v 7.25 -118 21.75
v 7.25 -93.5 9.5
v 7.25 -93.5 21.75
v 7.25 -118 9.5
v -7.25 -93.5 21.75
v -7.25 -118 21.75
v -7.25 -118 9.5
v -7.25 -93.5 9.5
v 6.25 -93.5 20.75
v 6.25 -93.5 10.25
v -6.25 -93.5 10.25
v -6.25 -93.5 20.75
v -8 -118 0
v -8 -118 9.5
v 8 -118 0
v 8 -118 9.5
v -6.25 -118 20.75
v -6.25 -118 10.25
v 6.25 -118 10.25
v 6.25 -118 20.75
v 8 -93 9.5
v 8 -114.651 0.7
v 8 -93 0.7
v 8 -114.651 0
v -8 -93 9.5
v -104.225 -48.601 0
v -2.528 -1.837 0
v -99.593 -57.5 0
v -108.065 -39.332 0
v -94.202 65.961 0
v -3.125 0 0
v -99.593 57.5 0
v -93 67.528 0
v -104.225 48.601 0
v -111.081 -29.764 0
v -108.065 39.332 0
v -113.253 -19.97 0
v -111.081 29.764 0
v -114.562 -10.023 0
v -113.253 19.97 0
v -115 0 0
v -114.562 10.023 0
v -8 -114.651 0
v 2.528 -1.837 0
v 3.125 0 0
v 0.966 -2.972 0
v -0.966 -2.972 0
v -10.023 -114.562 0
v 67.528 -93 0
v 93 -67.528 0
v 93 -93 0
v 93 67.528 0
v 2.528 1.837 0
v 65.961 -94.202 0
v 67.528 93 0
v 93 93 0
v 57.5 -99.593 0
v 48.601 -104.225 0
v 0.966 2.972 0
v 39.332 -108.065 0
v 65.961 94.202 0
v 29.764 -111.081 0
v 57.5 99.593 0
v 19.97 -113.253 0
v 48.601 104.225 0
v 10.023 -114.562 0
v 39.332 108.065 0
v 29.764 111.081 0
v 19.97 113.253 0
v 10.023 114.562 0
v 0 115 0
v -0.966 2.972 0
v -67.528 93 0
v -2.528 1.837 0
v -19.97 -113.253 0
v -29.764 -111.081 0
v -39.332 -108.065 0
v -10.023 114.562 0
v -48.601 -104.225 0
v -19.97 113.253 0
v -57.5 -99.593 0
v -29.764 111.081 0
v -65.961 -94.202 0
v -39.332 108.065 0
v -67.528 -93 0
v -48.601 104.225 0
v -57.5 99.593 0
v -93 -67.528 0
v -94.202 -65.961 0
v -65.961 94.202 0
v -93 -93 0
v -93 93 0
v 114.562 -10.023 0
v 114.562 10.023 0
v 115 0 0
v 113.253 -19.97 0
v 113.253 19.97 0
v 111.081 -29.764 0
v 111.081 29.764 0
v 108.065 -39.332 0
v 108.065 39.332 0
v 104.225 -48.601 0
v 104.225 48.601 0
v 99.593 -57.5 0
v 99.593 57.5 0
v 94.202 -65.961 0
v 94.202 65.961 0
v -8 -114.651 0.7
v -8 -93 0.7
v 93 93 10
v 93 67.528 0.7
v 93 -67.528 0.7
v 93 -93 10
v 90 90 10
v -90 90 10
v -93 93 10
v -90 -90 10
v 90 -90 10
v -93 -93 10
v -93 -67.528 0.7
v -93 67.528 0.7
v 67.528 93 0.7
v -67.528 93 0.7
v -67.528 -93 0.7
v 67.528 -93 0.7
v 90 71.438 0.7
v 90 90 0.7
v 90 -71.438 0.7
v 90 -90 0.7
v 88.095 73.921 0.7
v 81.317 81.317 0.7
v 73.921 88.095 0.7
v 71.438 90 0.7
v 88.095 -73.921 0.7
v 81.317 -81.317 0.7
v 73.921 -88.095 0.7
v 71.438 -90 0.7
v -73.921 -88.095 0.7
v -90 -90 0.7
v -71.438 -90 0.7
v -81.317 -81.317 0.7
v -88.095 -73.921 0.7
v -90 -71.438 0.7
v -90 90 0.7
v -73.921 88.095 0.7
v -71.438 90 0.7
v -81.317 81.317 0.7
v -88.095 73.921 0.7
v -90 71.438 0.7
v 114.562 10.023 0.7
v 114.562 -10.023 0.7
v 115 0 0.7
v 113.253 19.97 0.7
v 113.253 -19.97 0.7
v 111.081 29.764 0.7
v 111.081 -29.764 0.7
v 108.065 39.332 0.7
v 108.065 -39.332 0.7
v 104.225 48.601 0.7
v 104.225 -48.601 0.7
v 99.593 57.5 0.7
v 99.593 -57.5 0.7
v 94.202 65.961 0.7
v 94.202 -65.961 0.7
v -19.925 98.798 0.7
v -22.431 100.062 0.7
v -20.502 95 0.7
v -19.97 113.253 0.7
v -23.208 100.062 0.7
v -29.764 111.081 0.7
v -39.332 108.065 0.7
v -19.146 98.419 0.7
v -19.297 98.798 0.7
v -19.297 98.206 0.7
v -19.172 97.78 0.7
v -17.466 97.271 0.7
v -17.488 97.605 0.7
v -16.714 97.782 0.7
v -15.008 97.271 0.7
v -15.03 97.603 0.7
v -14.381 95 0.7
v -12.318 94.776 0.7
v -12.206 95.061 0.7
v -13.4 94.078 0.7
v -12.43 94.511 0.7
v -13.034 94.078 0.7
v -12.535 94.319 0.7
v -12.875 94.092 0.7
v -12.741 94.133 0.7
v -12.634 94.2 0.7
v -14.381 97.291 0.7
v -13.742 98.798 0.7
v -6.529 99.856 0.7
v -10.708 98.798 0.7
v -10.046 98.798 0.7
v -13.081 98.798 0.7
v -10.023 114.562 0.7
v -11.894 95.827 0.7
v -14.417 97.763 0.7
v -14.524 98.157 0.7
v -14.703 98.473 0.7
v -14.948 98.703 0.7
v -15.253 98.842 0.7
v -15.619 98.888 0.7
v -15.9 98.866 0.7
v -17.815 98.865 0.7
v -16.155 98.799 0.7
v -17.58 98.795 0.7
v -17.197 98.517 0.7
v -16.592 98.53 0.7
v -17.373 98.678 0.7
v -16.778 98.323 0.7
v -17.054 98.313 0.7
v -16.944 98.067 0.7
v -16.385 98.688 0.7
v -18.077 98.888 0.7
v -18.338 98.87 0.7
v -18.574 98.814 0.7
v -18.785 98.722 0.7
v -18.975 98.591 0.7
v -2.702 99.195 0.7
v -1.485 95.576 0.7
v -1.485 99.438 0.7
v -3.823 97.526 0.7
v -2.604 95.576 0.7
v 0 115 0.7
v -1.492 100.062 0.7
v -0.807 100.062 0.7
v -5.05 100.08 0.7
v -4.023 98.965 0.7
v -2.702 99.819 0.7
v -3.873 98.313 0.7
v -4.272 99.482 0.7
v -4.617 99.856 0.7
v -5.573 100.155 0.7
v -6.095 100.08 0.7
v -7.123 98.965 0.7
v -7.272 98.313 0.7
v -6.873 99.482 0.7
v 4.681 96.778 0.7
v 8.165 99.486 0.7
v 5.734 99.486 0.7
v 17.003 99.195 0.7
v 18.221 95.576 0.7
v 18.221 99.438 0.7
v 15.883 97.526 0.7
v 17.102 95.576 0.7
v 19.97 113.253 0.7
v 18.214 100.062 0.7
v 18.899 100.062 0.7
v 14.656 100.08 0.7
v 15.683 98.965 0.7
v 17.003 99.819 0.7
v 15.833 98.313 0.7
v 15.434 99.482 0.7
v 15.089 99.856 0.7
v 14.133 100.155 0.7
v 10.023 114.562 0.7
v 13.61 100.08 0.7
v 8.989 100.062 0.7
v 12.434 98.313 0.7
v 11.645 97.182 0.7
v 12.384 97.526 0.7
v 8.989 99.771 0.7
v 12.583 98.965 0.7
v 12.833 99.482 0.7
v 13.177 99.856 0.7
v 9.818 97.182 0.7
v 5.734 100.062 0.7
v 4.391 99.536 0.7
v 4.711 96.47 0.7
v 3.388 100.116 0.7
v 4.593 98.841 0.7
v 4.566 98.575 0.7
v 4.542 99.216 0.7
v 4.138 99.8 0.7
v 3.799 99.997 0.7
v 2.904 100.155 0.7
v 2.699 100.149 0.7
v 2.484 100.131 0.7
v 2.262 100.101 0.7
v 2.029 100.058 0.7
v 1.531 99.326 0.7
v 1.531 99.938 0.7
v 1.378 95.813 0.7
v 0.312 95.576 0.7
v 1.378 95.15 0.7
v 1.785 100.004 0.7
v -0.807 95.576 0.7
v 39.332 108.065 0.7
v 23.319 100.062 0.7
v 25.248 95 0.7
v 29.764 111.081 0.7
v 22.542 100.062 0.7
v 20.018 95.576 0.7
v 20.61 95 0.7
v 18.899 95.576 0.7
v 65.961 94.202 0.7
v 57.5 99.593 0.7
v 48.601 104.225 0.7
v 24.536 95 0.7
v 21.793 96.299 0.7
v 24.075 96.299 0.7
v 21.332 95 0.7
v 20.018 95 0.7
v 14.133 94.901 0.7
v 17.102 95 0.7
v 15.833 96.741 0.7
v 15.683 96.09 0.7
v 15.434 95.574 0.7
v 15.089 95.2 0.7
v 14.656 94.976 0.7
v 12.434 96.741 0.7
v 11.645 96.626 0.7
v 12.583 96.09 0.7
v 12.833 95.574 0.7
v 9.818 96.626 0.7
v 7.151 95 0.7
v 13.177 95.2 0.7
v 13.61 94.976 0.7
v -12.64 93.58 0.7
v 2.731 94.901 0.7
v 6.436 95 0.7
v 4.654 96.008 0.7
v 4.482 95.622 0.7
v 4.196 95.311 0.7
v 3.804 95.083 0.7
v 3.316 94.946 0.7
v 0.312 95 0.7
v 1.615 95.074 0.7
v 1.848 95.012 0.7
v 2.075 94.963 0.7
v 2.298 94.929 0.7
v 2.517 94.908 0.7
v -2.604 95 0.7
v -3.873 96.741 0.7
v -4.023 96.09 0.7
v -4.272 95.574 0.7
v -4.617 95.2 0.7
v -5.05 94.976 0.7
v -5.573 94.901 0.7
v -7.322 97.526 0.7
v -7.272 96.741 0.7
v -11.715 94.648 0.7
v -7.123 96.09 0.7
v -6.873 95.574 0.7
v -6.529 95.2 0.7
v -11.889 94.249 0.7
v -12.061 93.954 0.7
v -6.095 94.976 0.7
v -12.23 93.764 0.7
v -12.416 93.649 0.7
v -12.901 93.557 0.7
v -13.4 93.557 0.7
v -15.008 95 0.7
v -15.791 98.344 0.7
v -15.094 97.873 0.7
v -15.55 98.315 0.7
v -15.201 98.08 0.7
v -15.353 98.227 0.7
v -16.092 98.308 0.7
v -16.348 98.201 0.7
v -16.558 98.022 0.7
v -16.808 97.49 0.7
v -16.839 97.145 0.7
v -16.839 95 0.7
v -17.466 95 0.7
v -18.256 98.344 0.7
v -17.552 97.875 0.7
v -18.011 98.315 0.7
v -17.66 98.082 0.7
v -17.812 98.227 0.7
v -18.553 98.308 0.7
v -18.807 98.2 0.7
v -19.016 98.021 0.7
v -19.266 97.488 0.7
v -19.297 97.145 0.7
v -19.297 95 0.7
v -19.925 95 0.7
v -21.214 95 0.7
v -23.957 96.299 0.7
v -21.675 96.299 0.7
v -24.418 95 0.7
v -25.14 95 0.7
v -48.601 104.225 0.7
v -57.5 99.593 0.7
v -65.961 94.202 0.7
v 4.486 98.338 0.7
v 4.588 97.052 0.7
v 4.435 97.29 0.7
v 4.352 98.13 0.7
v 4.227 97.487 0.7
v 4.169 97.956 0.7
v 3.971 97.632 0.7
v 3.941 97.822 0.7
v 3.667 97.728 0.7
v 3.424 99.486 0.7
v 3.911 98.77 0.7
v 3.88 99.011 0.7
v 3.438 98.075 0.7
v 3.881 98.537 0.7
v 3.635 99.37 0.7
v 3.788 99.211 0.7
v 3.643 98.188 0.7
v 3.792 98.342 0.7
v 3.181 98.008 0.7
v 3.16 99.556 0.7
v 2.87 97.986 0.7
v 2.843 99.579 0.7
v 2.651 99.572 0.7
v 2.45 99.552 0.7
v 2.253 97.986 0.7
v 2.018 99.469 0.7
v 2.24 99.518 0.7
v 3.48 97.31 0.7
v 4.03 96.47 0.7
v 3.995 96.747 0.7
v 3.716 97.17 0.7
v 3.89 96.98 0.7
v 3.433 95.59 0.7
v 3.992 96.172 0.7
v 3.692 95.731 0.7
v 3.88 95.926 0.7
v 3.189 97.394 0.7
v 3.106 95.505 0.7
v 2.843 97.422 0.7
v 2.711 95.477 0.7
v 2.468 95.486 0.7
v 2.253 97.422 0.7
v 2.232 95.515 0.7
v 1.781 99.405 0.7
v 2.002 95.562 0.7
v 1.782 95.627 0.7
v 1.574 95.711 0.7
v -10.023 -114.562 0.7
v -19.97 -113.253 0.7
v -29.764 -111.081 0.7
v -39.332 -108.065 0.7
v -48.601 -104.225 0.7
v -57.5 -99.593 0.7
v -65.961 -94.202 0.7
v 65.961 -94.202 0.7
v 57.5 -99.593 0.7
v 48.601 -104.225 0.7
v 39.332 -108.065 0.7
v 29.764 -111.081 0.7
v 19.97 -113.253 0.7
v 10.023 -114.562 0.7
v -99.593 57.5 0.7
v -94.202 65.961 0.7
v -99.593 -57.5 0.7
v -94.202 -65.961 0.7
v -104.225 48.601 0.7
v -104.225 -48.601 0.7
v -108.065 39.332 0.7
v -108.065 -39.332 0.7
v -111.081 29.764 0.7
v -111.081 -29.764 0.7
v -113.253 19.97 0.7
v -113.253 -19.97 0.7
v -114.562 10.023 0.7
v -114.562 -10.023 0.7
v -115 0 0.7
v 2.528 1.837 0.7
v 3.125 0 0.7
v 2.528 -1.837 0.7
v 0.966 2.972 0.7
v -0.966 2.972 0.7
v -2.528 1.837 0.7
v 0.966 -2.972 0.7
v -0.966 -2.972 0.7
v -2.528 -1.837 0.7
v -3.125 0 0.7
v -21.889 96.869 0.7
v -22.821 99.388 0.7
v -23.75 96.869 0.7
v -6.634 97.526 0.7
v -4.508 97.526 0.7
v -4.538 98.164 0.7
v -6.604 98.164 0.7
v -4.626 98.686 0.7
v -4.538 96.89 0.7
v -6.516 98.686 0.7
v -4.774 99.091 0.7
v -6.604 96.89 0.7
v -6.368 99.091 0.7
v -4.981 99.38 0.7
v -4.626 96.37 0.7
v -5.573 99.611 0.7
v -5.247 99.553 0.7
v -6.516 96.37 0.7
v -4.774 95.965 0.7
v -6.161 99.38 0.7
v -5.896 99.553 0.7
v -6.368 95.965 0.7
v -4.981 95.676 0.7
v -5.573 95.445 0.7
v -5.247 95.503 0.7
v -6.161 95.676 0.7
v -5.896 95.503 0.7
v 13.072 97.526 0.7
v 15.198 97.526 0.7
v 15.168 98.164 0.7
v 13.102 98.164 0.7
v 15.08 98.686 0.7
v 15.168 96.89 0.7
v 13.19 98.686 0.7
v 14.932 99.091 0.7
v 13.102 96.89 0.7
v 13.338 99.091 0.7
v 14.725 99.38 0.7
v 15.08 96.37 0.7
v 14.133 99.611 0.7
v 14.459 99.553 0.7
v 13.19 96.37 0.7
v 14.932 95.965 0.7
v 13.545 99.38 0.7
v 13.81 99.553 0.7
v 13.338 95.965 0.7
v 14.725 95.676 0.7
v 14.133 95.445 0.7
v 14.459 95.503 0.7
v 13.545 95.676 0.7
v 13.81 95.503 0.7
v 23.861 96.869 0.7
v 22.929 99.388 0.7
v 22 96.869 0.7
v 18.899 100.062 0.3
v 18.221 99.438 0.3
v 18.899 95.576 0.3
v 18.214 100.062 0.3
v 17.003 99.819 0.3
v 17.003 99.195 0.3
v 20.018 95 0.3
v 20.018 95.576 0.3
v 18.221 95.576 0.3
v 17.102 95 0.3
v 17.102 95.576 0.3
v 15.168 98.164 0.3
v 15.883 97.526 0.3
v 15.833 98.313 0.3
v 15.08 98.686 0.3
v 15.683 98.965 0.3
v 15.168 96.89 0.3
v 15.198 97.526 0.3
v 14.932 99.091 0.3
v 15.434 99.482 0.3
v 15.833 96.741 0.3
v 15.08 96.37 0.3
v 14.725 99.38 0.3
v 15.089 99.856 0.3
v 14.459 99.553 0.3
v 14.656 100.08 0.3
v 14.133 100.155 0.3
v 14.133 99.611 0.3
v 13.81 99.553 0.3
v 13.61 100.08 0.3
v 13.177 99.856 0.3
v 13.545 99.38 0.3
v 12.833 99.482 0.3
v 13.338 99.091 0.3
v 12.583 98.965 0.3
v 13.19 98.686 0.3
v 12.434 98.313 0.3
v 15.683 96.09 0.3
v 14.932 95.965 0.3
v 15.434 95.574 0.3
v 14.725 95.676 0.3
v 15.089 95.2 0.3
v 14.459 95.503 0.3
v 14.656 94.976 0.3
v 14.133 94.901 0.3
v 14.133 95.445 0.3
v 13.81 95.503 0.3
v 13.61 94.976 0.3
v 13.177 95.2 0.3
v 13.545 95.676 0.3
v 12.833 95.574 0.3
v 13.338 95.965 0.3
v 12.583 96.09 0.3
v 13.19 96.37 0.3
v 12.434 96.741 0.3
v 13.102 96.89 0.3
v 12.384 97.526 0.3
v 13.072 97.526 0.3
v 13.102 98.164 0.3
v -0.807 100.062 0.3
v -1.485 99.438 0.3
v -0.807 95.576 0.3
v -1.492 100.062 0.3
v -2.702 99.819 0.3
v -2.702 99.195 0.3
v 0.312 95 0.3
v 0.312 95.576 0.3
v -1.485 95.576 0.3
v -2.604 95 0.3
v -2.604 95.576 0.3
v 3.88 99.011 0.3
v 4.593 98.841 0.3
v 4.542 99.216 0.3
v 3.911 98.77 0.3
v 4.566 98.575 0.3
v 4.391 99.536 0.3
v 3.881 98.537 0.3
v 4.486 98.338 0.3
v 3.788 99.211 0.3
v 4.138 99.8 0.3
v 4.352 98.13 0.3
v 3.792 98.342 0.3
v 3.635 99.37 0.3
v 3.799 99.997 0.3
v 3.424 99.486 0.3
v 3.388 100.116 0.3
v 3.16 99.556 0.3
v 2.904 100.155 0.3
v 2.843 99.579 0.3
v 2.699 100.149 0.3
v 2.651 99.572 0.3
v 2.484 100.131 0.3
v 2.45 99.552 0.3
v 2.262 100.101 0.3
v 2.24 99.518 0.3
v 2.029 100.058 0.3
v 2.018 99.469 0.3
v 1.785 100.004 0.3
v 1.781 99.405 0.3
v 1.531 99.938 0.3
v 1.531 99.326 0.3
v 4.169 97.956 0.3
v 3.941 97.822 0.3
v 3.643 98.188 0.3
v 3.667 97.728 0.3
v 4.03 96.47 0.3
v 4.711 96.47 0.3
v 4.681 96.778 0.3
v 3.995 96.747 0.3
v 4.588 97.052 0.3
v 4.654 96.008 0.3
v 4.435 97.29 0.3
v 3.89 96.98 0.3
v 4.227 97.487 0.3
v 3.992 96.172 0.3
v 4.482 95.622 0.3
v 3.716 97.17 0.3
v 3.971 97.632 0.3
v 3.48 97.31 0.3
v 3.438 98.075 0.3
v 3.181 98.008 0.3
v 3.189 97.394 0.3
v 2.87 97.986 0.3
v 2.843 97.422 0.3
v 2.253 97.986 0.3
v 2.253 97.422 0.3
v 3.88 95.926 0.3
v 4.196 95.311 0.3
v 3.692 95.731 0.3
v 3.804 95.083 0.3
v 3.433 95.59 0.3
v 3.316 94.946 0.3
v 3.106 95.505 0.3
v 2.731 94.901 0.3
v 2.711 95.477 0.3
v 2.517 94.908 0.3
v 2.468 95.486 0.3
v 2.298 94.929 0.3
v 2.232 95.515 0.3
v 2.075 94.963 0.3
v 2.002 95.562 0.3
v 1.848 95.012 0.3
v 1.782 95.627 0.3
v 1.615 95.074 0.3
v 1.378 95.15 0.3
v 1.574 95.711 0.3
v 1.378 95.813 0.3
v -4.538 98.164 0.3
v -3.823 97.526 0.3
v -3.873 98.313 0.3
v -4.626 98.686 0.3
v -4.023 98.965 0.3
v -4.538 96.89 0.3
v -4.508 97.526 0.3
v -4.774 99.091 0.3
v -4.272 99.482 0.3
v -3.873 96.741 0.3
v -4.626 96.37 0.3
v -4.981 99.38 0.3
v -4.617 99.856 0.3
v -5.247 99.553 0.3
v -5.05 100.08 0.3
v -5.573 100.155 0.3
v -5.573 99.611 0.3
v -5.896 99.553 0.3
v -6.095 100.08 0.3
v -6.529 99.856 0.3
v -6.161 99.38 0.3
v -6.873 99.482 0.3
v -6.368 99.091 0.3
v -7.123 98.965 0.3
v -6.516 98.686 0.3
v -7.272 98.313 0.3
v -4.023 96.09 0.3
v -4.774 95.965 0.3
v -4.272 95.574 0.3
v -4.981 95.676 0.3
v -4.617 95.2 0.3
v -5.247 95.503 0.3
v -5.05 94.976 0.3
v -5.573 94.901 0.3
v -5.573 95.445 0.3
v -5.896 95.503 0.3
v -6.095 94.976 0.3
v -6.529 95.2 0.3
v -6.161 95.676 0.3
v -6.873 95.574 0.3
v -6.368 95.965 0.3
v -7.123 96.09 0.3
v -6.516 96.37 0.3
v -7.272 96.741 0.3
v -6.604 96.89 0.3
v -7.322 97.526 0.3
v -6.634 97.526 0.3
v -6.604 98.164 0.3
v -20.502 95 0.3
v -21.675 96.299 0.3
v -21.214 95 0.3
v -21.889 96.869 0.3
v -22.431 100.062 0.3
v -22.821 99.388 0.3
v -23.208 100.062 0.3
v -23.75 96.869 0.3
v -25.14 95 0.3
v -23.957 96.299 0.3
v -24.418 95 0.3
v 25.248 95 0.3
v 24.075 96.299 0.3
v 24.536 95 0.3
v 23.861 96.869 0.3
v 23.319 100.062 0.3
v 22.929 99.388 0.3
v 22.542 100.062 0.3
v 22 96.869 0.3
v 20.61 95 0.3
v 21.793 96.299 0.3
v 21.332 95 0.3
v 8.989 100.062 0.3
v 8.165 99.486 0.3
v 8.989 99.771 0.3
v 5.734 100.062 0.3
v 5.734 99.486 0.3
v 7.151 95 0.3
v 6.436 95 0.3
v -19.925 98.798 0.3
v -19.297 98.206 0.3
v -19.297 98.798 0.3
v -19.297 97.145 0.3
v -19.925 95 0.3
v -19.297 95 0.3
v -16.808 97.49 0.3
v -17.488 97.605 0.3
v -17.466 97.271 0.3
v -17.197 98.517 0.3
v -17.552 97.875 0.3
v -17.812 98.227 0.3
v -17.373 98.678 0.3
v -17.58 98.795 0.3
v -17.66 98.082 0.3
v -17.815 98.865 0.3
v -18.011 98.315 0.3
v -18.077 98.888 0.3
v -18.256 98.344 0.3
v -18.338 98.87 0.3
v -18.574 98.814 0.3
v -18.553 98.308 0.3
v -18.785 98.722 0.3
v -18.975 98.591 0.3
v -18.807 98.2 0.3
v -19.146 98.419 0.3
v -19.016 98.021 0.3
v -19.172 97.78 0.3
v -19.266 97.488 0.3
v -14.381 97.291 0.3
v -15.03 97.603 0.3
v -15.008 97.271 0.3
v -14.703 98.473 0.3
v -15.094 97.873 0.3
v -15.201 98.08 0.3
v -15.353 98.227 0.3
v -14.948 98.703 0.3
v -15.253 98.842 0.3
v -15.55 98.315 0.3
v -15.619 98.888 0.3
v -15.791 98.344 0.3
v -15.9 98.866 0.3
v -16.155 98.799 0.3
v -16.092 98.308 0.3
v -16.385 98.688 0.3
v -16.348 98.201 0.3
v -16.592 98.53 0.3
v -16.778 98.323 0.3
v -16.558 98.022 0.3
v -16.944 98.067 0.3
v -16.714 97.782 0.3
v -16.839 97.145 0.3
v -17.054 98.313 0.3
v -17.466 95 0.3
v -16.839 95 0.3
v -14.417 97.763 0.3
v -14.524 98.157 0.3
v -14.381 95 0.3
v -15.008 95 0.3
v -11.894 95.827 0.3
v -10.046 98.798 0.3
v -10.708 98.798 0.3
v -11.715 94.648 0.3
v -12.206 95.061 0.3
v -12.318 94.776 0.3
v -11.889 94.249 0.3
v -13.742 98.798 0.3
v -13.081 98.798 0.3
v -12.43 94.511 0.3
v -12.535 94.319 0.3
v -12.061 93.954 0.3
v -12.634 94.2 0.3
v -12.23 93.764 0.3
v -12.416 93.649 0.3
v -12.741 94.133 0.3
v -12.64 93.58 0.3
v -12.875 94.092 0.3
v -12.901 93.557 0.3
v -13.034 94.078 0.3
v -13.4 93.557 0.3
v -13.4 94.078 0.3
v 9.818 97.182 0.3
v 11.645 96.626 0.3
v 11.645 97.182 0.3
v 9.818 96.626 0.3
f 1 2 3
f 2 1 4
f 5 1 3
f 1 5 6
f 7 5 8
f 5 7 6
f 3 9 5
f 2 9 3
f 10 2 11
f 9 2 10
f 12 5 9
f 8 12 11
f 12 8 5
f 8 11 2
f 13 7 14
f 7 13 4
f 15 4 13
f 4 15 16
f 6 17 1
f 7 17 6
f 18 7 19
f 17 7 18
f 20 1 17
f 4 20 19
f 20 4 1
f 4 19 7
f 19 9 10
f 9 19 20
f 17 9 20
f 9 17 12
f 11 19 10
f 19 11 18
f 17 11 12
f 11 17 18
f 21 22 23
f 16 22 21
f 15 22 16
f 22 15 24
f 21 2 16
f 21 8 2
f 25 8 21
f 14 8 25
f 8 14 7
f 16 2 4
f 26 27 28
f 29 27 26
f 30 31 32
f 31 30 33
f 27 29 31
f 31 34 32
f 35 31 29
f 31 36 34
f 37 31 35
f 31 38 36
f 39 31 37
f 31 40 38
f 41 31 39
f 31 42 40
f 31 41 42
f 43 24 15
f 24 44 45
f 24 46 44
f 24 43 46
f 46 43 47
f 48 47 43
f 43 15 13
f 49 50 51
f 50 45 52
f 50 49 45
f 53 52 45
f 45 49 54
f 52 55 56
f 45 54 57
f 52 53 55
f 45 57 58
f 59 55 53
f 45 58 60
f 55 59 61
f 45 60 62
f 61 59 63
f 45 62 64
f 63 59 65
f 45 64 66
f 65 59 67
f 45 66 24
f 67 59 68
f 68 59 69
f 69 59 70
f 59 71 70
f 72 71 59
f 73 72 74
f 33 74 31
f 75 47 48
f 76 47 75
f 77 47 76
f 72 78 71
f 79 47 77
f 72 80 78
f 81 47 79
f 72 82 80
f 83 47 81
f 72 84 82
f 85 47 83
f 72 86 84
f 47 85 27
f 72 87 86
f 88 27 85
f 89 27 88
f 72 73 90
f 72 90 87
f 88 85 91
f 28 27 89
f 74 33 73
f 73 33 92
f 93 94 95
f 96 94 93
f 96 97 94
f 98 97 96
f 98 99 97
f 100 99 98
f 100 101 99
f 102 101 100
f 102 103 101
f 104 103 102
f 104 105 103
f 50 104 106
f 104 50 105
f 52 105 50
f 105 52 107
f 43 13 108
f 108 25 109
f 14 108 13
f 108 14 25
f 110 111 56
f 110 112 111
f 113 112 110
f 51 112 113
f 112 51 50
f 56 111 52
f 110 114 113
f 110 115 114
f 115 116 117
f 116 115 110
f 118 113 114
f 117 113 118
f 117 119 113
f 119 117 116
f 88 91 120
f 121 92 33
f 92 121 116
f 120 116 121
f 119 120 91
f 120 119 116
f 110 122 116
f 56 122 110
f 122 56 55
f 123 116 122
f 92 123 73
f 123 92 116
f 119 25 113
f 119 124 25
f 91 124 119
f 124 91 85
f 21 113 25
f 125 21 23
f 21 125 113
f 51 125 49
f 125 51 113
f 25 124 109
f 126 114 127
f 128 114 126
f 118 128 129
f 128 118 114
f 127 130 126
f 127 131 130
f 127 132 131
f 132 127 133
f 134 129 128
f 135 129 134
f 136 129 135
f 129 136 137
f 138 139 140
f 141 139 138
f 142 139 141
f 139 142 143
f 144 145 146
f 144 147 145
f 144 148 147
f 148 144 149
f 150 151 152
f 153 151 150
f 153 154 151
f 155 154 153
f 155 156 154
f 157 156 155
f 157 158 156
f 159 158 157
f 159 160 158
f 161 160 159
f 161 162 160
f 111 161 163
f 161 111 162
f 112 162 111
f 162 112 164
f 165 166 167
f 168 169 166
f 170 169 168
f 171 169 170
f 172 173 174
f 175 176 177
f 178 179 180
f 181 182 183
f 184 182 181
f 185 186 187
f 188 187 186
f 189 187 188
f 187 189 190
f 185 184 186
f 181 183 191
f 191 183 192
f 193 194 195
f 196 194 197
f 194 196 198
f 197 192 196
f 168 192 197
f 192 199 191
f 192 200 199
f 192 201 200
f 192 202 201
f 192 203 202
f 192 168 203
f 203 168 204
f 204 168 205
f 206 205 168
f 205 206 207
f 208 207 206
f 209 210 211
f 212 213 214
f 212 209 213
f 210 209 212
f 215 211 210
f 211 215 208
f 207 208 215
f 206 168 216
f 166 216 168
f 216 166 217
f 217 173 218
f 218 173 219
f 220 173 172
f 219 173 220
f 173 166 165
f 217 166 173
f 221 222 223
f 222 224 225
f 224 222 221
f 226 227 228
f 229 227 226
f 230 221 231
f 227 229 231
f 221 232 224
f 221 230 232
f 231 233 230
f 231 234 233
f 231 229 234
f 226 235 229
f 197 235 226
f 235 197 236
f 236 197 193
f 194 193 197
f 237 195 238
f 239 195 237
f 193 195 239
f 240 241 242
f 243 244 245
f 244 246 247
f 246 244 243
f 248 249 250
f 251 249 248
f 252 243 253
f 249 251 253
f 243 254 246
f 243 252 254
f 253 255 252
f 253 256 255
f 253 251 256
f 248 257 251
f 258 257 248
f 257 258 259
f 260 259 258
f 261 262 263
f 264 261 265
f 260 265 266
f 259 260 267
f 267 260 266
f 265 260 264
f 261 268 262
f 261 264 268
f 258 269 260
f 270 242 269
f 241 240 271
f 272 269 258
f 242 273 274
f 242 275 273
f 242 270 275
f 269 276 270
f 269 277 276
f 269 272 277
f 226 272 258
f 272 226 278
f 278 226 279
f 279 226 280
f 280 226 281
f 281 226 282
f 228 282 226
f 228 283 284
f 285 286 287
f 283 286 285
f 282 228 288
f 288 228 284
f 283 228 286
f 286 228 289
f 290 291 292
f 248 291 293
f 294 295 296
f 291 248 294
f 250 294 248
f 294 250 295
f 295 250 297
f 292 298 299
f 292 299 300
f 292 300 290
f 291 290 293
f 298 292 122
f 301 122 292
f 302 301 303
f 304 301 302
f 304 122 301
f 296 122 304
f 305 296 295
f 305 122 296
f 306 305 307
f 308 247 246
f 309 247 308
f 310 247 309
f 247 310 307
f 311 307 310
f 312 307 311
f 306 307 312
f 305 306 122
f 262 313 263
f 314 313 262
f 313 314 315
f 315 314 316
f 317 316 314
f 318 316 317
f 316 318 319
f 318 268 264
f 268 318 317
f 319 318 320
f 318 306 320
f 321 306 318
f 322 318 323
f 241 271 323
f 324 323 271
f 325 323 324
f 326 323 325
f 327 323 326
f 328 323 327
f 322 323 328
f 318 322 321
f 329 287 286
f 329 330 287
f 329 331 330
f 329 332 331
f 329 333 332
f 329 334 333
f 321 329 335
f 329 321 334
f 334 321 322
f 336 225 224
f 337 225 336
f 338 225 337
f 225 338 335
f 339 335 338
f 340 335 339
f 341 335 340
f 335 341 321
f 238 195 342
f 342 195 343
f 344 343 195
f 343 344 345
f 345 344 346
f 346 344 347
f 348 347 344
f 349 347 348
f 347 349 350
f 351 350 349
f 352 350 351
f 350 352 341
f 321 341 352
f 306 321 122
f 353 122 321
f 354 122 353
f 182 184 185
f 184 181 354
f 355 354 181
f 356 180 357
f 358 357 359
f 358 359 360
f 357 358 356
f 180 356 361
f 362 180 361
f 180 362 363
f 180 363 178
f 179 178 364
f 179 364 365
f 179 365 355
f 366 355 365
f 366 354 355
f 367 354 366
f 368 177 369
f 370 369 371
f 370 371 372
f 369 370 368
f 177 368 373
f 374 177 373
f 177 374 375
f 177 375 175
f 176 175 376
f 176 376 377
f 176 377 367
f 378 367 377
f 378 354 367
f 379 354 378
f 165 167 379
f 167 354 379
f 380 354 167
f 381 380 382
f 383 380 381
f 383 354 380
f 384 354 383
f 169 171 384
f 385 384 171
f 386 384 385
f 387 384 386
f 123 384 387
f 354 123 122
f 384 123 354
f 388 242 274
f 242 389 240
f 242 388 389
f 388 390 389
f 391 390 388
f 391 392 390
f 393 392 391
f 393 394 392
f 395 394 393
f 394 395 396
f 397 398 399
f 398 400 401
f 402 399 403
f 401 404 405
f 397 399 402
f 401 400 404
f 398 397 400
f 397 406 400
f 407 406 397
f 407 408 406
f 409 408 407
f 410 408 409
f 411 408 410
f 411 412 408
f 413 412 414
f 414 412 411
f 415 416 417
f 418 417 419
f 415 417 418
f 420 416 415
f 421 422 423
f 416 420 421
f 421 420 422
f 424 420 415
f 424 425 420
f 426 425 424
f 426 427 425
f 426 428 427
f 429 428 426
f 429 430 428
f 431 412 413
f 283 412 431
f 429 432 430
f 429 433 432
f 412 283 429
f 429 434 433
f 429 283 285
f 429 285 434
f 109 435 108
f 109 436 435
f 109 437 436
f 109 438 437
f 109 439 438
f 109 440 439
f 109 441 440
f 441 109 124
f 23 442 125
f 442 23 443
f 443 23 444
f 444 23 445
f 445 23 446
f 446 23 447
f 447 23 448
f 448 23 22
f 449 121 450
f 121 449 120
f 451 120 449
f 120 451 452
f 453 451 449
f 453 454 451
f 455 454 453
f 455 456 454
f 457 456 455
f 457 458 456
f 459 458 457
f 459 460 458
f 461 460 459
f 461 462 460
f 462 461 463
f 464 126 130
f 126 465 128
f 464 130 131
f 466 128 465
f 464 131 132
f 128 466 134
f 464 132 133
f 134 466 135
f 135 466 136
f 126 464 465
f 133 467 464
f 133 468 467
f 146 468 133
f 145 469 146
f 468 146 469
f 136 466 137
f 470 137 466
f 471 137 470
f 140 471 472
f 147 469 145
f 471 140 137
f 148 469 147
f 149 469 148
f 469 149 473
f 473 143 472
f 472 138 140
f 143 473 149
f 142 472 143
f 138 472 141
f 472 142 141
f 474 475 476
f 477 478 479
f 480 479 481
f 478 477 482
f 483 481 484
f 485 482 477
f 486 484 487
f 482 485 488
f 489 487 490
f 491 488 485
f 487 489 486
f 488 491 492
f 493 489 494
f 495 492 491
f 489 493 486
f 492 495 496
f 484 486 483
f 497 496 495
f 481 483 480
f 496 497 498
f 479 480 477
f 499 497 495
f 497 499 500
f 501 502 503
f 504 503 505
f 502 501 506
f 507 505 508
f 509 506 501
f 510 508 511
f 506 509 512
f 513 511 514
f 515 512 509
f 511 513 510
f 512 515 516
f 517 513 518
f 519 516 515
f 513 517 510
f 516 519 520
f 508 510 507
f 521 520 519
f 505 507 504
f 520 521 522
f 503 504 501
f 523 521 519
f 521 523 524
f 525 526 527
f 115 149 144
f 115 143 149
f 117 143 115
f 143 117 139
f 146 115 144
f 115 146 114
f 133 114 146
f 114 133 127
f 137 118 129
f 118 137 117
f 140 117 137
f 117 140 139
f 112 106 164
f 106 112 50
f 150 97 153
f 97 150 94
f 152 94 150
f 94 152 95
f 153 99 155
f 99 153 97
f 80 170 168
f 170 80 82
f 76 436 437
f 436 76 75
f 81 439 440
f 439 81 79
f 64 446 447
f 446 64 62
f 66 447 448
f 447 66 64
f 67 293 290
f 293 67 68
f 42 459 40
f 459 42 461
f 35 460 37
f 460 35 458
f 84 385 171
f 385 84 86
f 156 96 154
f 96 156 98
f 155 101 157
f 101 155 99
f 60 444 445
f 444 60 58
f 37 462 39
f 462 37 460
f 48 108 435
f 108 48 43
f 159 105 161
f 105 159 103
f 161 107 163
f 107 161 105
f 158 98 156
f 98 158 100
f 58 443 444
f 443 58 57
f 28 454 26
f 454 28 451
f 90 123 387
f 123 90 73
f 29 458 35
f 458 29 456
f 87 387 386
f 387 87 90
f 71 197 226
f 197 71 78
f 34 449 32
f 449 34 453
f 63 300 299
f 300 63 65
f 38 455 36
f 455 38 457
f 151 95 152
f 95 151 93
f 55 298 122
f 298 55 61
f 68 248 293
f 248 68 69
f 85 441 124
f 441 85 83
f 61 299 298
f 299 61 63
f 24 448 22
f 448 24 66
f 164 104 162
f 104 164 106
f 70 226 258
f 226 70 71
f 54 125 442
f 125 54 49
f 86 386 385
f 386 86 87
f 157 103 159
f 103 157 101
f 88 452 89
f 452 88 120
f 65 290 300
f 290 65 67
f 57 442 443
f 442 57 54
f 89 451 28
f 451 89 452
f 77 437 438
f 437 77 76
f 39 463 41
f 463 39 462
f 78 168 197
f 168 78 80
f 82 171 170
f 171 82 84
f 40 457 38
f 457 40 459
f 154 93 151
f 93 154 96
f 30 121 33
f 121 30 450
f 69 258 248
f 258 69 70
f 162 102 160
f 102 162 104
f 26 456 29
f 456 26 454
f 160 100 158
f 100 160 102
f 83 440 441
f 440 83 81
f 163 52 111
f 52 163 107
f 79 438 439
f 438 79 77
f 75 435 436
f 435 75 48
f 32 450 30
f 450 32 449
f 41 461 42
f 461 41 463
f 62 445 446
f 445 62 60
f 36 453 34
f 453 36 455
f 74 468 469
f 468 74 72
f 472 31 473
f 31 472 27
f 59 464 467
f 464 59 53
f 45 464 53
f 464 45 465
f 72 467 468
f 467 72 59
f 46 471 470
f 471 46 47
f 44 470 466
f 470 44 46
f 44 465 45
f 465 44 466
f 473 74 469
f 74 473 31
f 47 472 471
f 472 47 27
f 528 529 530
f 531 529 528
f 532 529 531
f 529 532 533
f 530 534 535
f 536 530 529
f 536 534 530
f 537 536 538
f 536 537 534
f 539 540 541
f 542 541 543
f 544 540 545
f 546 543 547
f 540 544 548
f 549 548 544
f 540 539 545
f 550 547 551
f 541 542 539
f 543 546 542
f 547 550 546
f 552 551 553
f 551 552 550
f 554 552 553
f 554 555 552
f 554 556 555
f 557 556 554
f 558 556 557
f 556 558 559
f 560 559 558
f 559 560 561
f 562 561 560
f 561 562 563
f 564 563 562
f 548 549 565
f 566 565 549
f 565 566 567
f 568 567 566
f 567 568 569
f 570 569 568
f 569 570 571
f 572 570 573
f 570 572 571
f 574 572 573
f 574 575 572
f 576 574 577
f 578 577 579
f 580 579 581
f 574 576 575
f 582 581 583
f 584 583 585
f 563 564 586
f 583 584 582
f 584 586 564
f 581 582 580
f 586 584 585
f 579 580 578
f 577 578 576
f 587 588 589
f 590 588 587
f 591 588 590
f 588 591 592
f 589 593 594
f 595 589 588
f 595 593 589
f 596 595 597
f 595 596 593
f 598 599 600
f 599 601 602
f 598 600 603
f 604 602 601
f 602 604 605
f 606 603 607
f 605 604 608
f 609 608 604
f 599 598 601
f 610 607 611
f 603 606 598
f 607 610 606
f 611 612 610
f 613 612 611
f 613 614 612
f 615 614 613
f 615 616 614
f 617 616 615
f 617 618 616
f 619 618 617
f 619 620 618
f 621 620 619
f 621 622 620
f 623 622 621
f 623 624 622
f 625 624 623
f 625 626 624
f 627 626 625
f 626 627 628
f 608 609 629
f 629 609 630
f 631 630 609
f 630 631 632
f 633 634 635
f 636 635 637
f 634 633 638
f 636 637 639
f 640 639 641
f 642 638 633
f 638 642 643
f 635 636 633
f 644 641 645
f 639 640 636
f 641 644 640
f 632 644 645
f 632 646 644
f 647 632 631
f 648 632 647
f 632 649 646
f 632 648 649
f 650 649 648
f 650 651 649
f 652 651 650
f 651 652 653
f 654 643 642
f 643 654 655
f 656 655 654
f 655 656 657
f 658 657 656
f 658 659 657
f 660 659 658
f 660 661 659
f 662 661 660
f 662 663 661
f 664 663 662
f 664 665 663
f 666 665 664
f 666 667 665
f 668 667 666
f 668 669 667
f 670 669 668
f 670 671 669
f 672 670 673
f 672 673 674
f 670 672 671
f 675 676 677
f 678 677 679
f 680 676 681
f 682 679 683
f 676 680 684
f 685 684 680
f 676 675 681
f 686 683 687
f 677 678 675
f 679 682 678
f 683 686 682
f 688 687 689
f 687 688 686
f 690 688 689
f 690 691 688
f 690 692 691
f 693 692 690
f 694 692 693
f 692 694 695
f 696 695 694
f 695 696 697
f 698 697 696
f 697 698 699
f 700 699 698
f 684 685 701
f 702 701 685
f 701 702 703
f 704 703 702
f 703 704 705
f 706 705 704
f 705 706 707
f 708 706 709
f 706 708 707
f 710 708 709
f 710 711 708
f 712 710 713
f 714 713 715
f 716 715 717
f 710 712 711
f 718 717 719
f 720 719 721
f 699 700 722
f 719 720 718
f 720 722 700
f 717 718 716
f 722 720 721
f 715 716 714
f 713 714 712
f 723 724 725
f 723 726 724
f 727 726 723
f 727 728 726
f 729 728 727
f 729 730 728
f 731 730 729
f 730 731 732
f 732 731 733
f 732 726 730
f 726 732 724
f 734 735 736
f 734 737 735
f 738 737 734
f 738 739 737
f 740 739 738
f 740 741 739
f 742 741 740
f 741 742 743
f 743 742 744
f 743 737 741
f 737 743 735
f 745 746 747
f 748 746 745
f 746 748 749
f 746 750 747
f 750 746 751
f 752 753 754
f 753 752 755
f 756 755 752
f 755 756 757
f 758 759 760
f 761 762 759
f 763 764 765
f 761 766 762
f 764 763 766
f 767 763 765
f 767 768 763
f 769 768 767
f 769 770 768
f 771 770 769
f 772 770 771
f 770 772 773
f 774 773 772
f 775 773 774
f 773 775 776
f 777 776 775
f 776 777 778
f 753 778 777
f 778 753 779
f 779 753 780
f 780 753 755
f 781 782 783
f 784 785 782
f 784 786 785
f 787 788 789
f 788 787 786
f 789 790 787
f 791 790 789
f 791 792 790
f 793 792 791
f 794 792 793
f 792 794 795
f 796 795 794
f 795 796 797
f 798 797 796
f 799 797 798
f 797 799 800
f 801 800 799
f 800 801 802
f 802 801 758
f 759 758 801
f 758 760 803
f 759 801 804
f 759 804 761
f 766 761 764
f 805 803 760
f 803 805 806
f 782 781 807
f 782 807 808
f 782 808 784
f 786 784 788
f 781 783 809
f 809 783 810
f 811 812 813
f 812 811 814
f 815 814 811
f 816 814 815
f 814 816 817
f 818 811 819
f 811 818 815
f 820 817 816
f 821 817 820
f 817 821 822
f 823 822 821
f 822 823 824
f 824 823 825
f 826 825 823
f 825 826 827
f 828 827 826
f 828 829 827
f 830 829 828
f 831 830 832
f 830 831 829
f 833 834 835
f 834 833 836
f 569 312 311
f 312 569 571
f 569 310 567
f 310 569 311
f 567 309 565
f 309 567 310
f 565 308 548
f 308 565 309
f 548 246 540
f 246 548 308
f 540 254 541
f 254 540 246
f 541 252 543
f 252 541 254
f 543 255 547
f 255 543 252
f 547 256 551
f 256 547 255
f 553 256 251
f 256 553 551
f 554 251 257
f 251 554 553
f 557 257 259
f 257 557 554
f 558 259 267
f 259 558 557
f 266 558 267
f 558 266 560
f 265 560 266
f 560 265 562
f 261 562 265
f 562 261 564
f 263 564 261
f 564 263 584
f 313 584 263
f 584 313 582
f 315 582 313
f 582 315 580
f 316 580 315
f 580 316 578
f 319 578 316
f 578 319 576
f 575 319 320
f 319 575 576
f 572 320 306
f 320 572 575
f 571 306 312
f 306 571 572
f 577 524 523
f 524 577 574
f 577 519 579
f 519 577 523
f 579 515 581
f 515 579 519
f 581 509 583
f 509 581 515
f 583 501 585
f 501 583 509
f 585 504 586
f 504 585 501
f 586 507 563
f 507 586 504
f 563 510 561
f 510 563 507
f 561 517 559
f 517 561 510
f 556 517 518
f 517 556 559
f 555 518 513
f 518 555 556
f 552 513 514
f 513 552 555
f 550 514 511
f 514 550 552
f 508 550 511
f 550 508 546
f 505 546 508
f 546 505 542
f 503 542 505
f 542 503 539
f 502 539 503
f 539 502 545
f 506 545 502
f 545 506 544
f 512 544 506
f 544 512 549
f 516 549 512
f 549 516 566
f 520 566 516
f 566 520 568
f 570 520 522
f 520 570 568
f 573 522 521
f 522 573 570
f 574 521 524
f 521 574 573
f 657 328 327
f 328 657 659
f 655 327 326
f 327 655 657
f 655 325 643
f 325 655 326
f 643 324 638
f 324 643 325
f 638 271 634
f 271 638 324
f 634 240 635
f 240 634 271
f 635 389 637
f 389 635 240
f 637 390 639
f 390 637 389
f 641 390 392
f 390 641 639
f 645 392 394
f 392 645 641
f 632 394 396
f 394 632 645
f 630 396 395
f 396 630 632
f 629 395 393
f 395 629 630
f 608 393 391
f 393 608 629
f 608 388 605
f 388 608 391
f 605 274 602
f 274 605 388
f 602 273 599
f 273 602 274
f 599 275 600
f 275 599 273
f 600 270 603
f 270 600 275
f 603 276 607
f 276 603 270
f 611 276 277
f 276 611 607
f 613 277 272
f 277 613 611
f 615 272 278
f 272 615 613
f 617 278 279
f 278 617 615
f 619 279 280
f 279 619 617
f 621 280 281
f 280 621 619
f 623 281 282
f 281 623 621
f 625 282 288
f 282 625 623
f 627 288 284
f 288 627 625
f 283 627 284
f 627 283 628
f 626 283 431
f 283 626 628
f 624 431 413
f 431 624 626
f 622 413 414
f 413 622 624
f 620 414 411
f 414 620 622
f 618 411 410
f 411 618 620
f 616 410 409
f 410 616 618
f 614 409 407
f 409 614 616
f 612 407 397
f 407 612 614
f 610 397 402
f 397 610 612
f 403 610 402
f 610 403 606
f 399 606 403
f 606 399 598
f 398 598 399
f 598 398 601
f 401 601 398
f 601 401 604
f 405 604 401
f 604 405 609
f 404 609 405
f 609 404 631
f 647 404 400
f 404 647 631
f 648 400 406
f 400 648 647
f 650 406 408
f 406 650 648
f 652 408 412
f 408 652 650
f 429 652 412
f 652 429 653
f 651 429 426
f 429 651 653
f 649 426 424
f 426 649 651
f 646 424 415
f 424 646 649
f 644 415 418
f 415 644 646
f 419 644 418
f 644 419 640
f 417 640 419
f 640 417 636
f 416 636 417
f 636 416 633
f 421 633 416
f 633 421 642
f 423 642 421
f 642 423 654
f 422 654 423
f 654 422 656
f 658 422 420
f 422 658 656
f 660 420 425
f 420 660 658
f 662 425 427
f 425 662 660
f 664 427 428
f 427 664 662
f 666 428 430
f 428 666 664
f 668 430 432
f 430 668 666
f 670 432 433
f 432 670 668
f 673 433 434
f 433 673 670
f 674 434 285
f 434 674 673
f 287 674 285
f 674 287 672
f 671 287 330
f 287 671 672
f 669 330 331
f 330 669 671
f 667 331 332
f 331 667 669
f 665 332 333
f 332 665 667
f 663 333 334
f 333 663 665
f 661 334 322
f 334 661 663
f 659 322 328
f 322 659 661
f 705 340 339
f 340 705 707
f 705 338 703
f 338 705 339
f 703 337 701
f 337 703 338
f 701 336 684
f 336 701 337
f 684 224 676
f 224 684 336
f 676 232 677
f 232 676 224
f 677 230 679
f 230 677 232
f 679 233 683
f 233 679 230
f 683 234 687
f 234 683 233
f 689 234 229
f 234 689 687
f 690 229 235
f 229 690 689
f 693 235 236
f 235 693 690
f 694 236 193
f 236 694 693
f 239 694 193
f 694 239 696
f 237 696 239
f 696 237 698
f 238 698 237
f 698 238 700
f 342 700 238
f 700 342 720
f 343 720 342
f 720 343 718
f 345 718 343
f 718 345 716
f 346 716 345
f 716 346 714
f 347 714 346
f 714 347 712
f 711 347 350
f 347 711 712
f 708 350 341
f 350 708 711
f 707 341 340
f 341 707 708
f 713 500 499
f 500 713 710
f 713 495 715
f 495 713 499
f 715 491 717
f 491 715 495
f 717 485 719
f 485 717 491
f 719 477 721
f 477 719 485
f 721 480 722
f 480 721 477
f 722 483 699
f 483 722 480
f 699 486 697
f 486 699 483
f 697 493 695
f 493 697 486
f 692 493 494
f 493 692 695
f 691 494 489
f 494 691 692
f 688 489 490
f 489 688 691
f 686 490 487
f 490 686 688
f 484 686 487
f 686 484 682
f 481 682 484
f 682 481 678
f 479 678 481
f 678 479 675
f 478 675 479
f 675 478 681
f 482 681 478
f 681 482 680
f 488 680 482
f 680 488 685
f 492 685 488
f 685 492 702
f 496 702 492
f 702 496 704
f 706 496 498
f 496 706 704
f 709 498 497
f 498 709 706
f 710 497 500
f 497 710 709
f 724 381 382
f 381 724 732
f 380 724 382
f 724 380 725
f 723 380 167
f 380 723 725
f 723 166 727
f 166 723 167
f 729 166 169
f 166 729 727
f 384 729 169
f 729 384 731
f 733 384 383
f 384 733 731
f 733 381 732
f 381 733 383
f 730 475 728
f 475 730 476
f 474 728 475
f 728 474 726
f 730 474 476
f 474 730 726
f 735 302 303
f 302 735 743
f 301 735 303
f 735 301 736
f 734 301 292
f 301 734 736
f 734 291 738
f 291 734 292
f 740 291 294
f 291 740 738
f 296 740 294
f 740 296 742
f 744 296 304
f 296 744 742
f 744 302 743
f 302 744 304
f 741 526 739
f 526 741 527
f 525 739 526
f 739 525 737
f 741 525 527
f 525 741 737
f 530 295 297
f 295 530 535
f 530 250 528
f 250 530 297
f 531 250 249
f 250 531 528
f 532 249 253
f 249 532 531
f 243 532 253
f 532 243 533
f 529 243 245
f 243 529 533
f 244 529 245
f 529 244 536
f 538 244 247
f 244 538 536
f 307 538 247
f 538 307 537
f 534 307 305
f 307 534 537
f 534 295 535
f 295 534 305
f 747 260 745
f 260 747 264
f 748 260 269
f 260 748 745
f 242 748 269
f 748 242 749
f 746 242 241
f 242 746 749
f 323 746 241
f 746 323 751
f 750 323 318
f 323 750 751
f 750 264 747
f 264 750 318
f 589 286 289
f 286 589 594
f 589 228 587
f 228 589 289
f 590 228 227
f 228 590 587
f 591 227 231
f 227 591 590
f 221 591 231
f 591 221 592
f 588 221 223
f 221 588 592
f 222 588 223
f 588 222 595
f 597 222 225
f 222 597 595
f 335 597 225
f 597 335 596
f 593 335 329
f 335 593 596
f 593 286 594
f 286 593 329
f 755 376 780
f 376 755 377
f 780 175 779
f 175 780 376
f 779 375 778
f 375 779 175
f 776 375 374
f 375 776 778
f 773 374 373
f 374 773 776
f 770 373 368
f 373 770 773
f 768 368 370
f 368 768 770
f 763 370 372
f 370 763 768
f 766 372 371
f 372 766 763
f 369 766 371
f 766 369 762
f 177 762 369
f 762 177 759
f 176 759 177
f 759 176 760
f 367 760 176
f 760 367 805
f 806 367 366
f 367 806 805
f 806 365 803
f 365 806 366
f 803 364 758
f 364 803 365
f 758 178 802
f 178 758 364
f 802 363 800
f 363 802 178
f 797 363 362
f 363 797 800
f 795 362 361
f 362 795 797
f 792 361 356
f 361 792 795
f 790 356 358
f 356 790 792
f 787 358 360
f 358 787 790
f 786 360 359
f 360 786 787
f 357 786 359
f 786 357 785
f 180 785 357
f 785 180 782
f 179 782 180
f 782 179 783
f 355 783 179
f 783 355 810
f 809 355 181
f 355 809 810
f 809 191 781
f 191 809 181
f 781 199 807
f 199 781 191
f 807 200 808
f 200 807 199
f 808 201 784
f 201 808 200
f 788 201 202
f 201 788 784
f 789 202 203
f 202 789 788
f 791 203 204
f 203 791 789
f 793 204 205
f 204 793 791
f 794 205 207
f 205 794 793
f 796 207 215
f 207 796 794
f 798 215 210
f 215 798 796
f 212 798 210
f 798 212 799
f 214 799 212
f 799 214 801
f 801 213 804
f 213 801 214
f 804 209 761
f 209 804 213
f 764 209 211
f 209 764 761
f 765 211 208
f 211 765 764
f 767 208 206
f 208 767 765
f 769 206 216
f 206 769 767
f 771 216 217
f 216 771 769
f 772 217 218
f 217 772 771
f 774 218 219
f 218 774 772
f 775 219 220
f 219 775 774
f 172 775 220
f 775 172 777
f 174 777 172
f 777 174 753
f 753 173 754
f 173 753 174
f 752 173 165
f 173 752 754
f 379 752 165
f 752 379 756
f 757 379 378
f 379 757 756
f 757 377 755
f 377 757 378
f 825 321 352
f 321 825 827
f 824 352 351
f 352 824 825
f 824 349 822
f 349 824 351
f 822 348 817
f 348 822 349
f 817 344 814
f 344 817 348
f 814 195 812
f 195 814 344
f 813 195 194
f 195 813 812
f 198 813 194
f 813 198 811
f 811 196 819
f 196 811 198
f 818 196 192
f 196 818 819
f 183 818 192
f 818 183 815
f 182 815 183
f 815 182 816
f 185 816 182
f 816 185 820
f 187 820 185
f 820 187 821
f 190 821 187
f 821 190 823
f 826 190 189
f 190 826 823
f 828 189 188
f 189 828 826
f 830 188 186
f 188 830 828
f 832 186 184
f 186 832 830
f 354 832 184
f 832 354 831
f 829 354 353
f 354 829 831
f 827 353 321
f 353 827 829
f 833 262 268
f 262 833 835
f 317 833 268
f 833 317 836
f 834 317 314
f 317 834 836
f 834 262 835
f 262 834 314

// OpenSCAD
inch = 25.4;  // inch to mm
serial_number = "Amy 0137-01A";
deboss_depth = 0.4;
// font_face = "B612";
font_face = "Aldo";
font_size = 5;

// [ Base plate ]
base_plate_diameter = 230;
base_plate_thickness = 0.7;
base_plate_center_hole_diameter = 6.25;  // about 1/4"
tube_base_inset_side = 180;
tube_base_inset_ridge_height = 10;
tube_base_inset_ridge_width = 3;
wheel_shaft_height = 33/2;


// [ Motor ]
// including the front plate, but not the back contracts
motor_length = 24.0;
motor_width = 12.0;
motor_height = 10.0;
motor_box_clearance = 0.5;
motor_box_thickness = 1.0;



module _motor_box() {
    _sides_extra = motor_box_thickness * 2 + motor_box_clearance;

    translate([
        -(motor_width + _sides_extra) / 2,
        0,
        -(motor_width + _sides_extra) / 2,
    ])
    difference() {
        cube([
            motor_width + _sides_extra,
            motor_length + motor_box_clearance,
            motor_height + _sides_extra
        ]);

        translate([motor_box_thickness, -0.01, motor_box_thickness])
        cube([
            motor_width + motor_box_clearance,
            motor_length + motor_box_clearance + 0.02,
            motor_height + motor_box_clearance
        ]);
    }
}

module _base_plate() {
    cylinder(d = base_plate_diameter, h = base_plate_thickness, $fn=72);

    insert_outside = tube_base_inset_side + tube_base_inset_ridge_width * 2;

    translate ([-insert_outside/2, -insert_outside/2, 0]) {
        difference() {
            cube([insert_outside, insert_outside, tube_base_inset_ridge_height]);

            translate([tube_base_inset_ridge_width, tube_base_inset_ridge_width, base_plate_thickness])
            cube([tube_base_inset_side, tube_base_inset_side, tube_base_inset_ridge_height + 0.2]);
        }
    }
    // translate ([-base_plate_diameter/2, -base_plate_diameter/2, 0])
    // cube([base_plate_diameter, base_plate_diameter, base_plate_thickness]);


}

module _motor_box_support() {
    cube([motor_length, motor_width, 10]);
}

translate([0, -base_plate_diameter/2 - 3, 0]) {
    translate([0, 0, wheel_shaft_height])
    color("pink")
    _motor_box();

    translate([-motor_width/2 - motor_box_thickness * 2, 0, 0])
    color("cornflowerblue")
    cube([motor_width + motor_box_thickness * 4, motor_length + 2, 9 + 0.5]);
}

difference() {
    _base_plate();

    translate([0, 0, -0.1])
    cylinder(d = base_plate_center_hole_diameter, h = 10);

    #translate([0, tube_base_inset_side/2 + font_size, base_plate_thickness - deboss_depth])
    rotate([0,0,0])
    linear_extrude(deboss_depth + 0.01)
    text(
        serial_number,
        size = font_size,
        font = font_face,
        halign = "center",
        valign = "baseline"
    );
}
